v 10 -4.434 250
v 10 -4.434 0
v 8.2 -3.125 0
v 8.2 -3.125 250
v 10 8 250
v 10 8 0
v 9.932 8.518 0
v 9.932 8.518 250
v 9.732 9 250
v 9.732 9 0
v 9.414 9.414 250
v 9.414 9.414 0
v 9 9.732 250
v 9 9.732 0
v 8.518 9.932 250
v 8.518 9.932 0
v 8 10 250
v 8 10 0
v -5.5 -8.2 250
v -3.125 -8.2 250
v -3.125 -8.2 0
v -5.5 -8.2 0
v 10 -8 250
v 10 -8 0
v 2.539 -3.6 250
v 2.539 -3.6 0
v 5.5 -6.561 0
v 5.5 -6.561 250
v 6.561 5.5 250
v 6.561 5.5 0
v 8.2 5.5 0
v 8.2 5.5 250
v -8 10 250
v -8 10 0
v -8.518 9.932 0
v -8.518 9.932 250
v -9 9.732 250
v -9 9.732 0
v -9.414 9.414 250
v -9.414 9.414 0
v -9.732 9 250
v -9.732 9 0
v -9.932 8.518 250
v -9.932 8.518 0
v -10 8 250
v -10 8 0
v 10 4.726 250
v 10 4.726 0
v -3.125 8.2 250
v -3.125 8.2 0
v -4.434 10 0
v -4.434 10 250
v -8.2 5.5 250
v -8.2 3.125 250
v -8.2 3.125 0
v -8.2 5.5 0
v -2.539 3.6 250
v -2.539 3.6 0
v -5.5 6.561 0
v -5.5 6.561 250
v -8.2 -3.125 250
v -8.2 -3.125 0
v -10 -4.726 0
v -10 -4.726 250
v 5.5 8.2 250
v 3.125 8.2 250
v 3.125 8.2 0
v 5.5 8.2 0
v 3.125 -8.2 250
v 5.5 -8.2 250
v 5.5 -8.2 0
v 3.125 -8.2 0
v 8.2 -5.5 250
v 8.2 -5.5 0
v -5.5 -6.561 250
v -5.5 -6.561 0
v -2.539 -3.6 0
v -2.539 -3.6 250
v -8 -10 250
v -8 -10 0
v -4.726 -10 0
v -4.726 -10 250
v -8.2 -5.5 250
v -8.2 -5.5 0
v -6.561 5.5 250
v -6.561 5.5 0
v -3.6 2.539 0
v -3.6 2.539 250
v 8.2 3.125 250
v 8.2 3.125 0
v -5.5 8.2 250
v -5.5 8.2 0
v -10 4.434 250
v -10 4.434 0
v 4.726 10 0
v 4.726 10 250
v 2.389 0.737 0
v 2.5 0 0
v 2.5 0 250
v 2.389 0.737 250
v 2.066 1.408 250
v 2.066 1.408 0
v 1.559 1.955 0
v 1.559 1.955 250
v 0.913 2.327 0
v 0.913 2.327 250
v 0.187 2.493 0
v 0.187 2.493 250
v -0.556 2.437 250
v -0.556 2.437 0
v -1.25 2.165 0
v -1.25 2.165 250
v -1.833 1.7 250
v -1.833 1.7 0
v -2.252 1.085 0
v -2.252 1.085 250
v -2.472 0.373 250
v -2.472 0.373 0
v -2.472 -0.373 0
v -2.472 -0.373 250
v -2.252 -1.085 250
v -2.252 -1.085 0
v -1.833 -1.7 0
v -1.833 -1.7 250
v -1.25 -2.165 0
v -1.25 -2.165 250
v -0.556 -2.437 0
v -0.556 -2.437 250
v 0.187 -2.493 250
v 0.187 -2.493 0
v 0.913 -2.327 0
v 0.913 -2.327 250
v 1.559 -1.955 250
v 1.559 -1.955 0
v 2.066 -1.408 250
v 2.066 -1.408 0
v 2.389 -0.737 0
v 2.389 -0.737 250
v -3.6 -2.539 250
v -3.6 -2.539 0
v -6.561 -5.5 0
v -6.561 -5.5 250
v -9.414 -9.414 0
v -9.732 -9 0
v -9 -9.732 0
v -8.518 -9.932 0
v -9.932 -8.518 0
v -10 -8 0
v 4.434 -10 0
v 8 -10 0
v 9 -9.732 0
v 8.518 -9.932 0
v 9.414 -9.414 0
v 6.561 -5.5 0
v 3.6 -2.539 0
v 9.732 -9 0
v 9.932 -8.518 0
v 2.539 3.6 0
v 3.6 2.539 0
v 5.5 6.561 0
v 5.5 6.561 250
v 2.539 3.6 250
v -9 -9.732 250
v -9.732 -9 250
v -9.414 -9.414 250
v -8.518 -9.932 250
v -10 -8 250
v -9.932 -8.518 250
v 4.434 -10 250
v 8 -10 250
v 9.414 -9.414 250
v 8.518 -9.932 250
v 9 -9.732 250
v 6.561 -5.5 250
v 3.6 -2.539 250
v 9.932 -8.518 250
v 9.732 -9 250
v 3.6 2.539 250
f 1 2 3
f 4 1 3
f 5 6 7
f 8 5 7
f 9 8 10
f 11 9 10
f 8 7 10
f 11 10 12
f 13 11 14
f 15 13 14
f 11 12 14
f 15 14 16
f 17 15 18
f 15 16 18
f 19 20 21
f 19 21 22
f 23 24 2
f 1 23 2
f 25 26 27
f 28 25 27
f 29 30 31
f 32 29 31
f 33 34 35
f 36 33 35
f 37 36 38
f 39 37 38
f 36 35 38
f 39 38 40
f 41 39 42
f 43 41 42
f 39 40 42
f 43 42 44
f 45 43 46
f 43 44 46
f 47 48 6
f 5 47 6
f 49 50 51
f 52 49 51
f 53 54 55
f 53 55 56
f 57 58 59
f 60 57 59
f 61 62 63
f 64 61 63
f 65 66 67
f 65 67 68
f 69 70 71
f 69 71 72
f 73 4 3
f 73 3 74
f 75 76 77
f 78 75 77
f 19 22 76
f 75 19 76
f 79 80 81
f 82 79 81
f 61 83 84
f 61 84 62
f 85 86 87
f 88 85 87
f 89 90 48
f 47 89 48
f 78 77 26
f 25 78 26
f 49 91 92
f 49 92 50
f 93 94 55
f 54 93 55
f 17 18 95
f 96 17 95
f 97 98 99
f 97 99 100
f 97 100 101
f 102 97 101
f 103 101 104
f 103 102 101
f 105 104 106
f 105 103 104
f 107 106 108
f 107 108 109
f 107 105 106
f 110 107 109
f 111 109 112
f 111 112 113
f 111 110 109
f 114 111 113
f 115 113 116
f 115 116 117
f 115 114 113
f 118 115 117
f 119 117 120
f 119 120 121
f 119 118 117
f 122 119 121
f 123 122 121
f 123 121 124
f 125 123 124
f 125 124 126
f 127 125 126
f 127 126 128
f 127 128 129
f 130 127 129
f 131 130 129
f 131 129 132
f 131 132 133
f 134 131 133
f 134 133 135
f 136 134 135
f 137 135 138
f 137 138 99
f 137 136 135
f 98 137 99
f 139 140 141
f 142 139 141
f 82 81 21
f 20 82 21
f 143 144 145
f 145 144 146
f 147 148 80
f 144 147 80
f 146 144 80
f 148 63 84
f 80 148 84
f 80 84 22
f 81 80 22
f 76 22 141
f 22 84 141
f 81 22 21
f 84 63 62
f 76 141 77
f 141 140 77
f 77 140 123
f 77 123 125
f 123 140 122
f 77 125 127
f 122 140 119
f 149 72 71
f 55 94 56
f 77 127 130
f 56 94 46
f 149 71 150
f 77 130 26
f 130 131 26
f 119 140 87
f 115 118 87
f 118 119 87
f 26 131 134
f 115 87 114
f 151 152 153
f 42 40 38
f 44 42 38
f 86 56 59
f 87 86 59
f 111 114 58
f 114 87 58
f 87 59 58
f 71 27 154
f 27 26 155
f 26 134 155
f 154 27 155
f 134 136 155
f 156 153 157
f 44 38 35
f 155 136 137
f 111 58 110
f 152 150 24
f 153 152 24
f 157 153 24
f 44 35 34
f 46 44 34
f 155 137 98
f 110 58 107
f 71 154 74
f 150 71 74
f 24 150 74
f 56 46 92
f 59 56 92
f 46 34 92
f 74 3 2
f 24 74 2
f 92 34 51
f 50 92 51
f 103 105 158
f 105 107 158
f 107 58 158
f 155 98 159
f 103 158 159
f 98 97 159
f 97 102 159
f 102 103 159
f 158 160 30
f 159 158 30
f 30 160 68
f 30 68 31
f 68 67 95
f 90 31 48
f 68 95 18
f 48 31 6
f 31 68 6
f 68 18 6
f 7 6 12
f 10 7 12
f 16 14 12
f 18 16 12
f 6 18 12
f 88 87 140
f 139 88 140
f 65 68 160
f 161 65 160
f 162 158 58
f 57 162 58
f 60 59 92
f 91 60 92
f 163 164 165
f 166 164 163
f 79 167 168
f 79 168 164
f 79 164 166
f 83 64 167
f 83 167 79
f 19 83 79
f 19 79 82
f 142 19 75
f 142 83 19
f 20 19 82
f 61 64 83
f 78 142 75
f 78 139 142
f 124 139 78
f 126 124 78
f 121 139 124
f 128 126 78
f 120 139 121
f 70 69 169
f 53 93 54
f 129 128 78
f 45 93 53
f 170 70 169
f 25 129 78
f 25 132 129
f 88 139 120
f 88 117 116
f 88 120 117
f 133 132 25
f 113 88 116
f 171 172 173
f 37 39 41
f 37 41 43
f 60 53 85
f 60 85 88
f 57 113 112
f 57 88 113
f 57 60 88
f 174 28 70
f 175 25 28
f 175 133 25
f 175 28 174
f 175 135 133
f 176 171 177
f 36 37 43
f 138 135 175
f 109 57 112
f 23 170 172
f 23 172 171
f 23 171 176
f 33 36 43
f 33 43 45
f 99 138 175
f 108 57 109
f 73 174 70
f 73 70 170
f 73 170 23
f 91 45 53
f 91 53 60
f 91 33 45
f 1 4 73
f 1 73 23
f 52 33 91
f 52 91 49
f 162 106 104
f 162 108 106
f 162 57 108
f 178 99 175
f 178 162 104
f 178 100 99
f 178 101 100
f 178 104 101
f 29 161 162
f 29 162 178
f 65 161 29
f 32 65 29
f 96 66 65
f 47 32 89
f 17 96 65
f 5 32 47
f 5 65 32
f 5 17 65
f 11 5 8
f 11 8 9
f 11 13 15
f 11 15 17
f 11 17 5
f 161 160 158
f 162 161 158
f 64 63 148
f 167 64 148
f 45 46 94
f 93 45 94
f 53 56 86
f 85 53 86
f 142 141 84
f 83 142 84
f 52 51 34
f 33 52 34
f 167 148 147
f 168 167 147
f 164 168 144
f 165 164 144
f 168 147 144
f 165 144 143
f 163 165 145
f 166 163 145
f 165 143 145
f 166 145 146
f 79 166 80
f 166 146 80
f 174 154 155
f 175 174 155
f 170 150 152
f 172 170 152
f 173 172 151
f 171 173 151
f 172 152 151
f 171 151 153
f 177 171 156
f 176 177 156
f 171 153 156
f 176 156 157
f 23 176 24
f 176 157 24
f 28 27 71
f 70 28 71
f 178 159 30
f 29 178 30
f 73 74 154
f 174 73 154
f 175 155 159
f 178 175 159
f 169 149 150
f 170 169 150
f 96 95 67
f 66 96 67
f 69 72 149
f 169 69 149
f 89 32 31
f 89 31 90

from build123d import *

# Parameters (mm, degrees)
SKETCH1_R           = 2.5
BOSS_EXTRUDE1_DEPTH = 250


with BuildPart() as part:
    # Sketch1 → Boss-Extrude1 (new body)
    with BuildSketch(Plane.XY):
        with BuildLine():
            Line((-4.725542729, -10), (-3.125, -8.2))
            Line((-3.125, -8.2), (-5.5, -8.2))
            Line((-5.5, -8.2), (-5.5, -6.560660172))
            Line((-5.5, -6.560660172), (-2.539339828, -3.6))
            Line((-2.539339828, -3.6), (2.539339828, -3.6))
            Line((2.539339828, -3.6), (5.5, -6.560660172))
            Line((5.5, -6.560660172), (5.5, -8.2))
            Line((5.5, -8.2), (3.125, -8.2))
            Line((3.125, -8.2), (4.434457271, -10))
            Line((4.434457271, -10), (8, -10))
            ThreePointArc((8, -10), (9.414213562, -9.414213562), (10, -8))
            Line((10, -8), (10, -4.434457271))
            Line((10, -4.434457271), (8.2, -3.125))
            Line((8.2, -3.125), (8.2, -5.5))
            Line((8.2, -5.5), (6.560660172, -5.5))
            Line((6.560660172, -5.5), (3.6, -2.539339828))
            Line((3.6, -2.539339828), (3.6, 2.539339828))
            Line((3.6, 2.539339828), (6.560660172, 5.5))
            Line((6.560660172, 5.5), (8.2, 5.5))
            Line((8.2, 5.5), (8.2, 3.125))
            Line((8.2, 3.125), (10, 4.725542729))
            Line((10, 4.725542729), (10, 8))
            ThreePointArc((10, 8), (9.414213562, 9.414213562), (8, 10))
            Line((8, 10), (4.725542729, 10))
            Line((4.725542729, 10), (3.125, 8.2))
            Line((3.125, 8.2), (5.5, 8.2))
            Line((5.5, 8.2), (5.5, 6.560660172))
            Line((5.5, 6.560660172), (2.539339828, 3.6))
            Line((2.539339828, 3.6), (-2.539339828, 3.6))
            Line((-2.539339828, 3.6), (-5.5, 6.560660172))
            Line((-5.5, 6.560660172), (-5.5, 8.2))
            Line((-5.5, 8.2), (-3.125, 8.2))
            Line((-3.125, 8.2), (-4.434457271, 10))
            Line((-4.434457271, 10), (-8, 10))
            ThreePointArc((-8, 10), (-9.414213562, 9.414213562), (-10, 8))
            Line((-10, 8), (-10, 4.434457271))
            Line((-10, 4.434457271), (-8.2, 3.125))
            Line((-8.2, 3.125), (-8.2, 5.5))
            Line((-8.2, 5.5), (-6.560660172, 5.5))
            Line((-6.560660172, 5.5), (-3.6, 2.539339828))
            Line((-3.6, 2.539339828), (-3.6, -2.539339828))
            Line((-3.6, -2.539339828), (-6.560660172, -5.5))
            Line((-6.560660172, -5.5), (-8.2, -5.5))
            Line((-8.2, -5.5), (-8.2, -3.125))
            Line((-8.2, -3.125), (-10, -4.725542729))
            Line((-10, -4.725542729), (-10, -8))
            ThreePointArc((-10, -8), (-9.414213562, -9.414213562), (-8, -10))
            Line((-8, -10), (-4.725542729, -10))
        make_face()
        Circle(SKETCH1_R, mode=Mode.SUBTRACT)
    extrude(amount=BOSS_EXTRUDE1_DEPTH)


solid = part.part
